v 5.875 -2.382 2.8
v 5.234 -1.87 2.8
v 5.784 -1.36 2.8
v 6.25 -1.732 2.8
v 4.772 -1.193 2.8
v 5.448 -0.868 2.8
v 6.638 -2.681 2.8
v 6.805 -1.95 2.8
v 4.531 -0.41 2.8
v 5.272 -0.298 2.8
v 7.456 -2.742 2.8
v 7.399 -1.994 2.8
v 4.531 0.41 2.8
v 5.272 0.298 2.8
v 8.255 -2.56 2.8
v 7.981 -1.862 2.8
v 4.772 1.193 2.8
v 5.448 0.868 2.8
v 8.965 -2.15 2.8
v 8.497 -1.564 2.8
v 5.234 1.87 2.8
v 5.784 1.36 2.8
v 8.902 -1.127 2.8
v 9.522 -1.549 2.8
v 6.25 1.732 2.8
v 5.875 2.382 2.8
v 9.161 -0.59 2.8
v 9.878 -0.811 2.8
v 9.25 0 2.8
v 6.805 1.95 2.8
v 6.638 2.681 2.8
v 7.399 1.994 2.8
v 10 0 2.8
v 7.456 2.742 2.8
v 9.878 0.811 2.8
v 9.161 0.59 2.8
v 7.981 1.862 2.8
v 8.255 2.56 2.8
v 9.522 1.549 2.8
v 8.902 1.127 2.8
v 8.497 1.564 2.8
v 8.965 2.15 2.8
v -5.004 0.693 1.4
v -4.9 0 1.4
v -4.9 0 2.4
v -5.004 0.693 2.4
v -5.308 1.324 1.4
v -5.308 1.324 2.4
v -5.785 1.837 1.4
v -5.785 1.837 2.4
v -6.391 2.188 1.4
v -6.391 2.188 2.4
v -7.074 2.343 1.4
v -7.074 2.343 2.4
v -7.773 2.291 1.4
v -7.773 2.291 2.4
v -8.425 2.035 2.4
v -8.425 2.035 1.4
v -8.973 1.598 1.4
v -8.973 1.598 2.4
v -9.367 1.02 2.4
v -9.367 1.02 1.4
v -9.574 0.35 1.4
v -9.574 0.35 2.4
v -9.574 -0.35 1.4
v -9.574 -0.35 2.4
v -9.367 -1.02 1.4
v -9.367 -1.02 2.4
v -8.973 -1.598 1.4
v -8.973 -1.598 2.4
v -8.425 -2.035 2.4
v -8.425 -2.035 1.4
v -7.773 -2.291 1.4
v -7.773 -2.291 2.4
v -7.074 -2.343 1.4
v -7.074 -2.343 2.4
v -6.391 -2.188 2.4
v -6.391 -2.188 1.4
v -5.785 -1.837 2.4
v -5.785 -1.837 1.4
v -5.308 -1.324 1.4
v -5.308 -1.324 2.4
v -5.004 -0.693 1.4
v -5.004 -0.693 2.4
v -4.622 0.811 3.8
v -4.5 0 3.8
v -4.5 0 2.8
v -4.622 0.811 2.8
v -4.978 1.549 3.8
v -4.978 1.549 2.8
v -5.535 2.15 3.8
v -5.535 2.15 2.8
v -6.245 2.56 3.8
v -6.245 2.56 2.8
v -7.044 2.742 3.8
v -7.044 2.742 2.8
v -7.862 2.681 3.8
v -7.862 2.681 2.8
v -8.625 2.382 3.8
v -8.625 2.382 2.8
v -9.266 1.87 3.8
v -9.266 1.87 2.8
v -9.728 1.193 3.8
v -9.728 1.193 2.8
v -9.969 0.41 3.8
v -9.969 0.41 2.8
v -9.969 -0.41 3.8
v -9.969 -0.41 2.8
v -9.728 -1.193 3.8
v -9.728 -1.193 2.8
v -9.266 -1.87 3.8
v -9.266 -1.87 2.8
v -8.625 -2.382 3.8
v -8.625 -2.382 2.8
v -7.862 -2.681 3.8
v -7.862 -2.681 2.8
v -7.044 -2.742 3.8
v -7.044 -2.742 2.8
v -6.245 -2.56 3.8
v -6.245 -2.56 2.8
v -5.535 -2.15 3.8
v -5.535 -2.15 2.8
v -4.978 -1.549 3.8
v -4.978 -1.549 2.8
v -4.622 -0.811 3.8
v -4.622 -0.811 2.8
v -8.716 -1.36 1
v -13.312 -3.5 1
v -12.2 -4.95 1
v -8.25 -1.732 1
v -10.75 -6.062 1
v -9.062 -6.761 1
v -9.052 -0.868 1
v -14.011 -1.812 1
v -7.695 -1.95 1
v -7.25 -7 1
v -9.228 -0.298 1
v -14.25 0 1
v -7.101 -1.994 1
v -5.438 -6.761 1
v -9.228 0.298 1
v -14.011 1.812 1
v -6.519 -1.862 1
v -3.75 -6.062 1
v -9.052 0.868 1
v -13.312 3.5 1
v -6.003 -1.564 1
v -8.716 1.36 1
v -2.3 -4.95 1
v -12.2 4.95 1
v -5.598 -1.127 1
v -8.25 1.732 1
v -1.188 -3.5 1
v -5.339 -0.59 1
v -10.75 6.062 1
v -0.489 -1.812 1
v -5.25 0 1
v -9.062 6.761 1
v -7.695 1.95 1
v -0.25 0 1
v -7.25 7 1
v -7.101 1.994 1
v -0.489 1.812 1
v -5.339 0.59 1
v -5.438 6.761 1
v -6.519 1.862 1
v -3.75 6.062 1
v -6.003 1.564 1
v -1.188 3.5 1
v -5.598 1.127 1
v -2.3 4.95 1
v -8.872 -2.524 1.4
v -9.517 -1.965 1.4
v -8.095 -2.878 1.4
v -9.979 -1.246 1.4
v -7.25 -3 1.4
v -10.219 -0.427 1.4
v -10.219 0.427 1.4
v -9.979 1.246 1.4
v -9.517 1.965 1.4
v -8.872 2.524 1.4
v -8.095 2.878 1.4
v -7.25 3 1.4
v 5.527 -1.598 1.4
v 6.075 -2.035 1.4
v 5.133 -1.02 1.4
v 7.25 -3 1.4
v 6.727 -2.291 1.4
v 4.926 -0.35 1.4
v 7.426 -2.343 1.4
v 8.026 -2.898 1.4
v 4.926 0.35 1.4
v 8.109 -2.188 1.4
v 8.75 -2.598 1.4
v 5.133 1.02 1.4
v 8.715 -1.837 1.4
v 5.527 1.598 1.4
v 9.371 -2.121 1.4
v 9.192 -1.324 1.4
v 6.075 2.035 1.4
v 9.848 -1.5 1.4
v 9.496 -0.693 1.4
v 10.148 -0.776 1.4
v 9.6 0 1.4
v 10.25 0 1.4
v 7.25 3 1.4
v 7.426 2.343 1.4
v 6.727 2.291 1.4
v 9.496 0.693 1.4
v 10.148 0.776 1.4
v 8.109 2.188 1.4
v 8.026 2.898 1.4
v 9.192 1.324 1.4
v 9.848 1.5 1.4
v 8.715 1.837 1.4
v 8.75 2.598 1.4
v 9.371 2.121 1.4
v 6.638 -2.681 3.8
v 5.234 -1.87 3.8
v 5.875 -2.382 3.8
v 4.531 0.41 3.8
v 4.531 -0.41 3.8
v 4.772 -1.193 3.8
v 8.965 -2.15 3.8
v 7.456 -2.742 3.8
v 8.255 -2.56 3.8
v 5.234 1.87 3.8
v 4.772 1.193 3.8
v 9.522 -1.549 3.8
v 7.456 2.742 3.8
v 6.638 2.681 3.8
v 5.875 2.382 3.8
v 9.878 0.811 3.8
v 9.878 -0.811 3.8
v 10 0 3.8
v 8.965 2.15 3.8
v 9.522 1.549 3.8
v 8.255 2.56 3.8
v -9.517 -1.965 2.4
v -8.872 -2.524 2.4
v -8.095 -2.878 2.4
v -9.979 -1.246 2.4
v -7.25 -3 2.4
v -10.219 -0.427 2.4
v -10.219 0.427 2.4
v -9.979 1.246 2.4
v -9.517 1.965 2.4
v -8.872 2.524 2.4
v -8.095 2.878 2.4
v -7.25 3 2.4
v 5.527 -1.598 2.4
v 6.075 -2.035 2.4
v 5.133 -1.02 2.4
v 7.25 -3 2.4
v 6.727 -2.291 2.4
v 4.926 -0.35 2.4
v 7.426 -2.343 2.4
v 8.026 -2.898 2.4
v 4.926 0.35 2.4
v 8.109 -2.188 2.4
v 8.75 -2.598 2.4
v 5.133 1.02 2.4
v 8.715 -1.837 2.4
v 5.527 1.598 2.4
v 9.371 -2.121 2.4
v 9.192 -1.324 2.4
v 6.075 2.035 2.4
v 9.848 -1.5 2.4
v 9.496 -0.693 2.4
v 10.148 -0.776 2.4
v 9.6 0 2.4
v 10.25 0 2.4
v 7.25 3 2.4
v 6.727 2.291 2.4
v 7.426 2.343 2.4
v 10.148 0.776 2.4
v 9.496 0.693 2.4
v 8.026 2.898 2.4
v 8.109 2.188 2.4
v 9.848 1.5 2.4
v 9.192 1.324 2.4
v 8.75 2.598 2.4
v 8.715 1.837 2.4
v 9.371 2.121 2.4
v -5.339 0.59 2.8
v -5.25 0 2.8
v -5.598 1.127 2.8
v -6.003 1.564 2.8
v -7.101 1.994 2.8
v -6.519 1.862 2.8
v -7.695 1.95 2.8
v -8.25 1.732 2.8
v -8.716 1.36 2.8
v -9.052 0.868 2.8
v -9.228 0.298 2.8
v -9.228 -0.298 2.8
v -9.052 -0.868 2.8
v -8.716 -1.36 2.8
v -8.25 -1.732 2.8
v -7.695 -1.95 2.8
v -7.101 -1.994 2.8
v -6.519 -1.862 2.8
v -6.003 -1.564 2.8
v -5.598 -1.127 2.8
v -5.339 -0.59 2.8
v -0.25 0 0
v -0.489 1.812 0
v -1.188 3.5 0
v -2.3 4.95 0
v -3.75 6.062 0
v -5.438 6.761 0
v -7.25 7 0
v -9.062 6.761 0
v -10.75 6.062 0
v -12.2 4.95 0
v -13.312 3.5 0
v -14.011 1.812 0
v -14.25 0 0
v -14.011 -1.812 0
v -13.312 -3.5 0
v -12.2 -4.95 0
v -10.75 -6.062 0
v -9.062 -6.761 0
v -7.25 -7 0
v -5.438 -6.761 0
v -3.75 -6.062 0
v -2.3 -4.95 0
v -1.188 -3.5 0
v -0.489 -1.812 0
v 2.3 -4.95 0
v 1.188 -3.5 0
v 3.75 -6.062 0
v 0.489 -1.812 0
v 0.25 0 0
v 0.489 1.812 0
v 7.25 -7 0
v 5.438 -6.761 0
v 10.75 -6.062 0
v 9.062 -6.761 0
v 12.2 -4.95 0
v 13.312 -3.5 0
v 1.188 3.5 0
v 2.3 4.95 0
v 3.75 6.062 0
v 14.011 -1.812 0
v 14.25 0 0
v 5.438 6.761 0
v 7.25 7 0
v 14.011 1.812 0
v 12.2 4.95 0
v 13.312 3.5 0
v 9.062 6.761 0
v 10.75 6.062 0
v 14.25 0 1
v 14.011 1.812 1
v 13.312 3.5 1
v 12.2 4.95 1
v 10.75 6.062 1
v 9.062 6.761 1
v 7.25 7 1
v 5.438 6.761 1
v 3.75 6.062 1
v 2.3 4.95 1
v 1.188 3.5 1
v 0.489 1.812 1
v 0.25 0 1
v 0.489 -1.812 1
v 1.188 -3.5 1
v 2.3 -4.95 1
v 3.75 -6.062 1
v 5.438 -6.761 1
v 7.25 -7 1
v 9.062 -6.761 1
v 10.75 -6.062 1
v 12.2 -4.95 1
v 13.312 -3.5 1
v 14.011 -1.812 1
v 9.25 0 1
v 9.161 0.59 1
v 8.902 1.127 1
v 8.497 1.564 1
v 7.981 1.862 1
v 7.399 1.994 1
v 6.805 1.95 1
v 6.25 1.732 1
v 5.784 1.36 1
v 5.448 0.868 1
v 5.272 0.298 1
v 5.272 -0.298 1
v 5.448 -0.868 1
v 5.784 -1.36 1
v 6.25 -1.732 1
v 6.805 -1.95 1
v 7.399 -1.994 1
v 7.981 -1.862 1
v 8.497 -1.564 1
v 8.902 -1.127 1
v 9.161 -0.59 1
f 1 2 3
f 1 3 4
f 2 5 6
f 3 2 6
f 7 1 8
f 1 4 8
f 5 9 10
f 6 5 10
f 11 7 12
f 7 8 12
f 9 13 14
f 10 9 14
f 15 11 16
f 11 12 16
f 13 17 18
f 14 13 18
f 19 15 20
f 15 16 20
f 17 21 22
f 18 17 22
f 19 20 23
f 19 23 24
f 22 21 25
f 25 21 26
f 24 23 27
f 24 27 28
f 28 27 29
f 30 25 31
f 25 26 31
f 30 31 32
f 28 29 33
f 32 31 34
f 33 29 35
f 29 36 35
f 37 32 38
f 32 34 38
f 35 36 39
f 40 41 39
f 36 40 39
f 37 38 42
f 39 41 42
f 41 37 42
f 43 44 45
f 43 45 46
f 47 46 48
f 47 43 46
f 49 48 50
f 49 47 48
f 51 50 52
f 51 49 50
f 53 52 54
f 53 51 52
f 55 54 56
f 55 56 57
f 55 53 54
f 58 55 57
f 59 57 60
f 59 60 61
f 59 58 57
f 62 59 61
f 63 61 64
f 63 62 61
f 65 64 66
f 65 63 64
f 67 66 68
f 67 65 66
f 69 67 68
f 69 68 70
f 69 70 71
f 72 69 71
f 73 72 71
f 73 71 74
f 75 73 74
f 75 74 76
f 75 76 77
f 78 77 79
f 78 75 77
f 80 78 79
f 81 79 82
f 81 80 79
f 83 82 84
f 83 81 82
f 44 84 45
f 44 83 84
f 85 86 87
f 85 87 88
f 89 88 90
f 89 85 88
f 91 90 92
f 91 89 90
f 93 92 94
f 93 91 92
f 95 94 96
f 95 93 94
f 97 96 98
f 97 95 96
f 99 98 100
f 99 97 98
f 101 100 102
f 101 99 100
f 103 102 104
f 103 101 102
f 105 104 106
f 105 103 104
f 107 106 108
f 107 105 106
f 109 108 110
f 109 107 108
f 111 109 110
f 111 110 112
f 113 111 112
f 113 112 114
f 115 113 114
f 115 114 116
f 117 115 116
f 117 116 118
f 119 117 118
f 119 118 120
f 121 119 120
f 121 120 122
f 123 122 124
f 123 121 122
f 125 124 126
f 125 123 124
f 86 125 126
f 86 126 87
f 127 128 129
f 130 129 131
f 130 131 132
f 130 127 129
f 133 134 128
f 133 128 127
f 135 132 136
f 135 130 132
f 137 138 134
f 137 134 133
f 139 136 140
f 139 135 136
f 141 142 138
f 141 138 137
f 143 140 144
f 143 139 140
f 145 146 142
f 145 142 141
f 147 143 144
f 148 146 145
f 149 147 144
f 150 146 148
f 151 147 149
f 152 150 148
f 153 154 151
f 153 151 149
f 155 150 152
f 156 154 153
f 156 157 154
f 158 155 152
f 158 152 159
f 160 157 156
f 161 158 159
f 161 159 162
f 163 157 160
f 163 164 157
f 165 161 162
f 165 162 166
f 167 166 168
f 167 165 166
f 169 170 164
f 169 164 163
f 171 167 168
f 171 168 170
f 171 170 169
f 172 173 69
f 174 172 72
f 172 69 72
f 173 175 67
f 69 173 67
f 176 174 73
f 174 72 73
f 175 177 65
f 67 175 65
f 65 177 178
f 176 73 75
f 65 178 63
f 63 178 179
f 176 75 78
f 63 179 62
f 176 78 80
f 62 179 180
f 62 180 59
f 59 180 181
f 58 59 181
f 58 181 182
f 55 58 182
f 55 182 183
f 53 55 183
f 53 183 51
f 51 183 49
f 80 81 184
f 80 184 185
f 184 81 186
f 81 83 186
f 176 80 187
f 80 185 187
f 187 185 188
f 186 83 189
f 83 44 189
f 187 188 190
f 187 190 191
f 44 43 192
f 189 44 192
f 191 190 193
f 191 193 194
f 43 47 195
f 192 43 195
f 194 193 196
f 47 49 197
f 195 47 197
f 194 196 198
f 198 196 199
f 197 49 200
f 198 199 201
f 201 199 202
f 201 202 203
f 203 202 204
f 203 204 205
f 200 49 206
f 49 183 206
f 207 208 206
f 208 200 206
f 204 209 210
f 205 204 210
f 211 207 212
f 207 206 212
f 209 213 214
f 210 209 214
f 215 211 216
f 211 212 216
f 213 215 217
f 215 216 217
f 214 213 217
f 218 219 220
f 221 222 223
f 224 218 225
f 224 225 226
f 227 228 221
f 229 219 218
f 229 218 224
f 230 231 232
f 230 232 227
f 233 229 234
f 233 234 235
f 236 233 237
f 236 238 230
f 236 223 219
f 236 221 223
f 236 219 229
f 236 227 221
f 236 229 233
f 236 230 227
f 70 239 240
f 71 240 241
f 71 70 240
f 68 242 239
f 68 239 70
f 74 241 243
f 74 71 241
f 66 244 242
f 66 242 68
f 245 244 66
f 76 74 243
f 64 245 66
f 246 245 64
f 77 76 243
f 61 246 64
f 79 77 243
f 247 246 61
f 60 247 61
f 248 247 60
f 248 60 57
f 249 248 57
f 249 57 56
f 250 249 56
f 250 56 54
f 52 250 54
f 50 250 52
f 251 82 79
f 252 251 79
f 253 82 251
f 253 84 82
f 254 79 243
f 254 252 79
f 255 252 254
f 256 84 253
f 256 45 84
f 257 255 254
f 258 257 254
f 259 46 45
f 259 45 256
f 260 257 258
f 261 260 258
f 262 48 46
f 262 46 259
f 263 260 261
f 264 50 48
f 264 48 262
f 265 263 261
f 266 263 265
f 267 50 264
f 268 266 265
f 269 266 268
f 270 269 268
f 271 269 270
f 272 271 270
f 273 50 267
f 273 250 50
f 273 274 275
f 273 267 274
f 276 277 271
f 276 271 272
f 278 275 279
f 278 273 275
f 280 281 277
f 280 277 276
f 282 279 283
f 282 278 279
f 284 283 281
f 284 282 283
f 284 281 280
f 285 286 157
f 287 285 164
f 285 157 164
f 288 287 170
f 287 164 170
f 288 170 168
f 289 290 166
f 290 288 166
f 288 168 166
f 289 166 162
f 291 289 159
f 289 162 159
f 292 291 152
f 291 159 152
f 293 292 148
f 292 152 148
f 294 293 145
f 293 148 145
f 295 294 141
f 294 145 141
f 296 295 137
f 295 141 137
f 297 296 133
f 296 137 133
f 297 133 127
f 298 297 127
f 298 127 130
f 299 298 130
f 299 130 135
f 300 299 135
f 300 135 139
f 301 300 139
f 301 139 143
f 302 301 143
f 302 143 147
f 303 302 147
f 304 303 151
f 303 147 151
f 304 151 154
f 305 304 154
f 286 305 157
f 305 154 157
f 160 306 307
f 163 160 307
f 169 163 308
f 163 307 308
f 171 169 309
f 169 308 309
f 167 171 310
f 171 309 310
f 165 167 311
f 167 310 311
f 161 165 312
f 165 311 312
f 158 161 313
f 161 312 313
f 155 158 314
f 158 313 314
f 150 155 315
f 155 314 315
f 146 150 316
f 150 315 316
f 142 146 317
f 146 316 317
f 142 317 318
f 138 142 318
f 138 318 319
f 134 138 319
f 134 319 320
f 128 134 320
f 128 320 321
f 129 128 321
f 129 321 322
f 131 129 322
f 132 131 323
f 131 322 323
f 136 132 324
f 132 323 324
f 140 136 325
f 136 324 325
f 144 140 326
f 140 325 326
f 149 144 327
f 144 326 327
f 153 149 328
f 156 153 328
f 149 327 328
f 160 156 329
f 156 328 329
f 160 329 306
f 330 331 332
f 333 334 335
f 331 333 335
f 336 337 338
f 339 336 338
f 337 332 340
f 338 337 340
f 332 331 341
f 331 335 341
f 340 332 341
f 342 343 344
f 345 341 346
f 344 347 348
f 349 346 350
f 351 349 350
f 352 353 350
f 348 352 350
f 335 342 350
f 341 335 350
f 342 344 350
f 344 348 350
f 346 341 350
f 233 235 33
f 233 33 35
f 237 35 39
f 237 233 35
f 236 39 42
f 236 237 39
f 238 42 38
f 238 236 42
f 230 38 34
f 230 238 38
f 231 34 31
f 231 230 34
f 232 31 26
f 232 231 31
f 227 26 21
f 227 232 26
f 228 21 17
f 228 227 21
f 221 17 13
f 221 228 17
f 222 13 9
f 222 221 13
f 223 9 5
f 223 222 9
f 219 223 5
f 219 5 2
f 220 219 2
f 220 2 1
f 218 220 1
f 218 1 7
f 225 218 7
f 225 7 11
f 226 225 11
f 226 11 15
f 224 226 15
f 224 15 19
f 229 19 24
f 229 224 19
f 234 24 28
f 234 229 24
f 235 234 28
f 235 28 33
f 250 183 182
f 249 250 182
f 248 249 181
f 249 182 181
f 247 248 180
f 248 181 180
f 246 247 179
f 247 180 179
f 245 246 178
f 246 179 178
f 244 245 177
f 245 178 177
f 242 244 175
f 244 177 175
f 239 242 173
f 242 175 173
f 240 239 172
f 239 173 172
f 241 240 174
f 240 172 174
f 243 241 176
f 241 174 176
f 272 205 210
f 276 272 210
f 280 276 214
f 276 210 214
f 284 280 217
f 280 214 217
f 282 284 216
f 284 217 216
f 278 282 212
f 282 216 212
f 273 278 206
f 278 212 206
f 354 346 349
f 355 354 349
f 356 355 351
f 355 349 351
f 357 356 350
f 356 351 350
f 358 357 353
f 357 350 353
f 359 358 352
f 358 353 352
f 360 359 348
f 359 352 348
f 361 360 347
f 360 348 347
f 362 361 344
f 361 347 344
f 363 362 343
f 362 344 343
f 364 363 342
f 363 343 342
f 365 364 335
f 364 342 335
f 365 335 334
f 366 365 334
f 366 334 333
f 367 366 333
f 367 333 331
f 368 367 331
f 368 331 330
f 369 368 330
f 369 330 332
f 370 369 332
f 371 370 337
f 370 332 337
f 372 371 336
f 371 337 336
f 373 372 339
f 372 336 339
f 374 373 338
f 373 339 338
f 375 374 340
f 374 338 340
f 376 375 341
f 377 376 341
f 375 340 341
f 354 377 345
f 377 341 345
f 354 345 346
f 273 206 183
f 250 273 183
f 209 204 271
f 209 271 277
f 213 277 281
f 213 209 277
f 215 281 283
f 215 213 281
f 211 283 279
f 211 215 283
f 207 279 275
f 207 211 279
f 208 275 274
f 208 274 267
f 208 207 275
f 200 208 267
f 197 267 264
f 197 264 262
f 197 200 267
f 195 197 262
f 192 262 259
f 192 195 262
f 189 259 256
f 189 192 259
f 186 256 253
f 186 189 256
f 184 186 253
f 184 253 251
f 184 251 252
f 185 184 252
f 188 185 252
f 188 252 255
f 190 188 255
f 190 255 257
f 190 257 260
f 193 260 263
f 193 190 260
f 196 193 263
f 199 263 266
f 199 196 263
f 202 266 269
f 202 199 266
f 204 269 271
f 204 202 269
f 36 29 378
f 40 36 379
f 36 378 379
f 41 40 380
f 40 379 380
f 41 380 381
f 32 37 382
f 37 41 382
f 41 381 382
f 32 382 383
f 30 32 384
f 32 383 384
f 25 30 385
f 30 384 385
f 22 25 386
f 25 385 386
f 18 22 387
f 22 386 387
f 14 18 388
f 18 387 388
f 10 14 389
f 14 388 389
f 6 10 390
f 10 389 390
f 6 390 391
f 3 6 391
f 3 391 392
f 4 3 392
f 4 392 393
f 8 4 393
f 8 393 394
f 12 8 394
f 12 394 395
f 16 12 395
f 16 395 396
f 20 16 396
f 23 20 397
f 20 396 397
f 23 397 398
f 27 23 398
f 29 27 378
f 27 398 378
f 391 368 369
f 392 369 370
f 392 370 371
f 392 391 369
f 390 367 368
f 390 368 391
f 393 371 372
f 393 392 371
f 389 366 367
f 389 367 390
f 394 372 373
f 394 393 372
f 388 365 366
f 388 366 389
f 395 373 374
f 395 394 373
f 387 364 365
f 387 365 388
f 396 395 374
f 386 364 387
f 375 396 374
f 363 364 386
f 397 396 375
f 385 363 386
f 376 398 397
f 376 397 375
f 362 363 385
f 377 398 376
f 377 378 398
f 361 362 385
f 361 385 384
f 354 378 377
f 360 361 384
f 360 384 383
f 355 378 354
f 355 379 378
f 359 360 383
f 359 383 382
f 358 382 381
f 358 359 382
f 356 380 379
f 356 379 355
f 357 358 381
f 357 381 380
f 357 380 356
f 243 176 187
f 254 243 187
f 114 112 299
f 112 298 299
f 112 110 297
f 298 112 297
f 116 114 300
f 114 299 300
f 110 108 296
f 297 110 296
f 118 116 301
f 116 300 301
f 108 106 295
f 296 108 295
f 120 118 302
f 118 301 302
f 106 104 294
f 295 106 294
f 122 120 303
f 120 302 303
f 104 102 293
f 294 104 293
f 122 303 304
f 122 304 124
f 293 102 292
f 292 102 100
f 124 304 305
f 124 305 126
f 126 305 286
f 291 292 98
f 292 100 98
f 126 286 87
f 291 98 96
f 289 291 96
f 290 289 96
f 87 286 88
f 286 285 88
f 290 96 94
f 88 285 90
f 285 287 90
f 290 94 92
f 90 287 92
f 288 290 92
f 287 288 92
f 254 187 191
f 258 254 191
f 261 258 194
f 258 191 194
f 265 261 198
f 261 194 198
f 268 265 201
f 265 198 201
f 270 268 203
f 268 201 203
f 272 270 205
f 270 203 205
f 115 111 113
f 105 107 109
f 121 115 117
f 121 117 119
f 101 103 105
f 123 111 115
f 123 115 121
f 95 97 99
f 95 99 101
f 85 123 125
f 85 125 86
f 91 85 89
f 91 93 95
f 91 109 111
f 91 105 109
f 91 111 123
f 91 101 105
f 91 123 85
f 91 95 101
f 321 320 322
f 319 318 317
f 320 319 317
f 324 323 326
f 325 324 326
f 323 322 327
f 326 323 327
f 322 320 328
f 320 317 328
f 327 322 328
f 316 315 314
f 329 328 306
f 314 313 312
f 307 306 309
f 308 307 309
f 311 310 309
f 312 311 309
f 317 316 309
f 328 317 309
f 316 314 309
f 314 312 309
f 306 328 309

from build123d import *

# Parameters (mm, degrees)
F0_R     = 7
F0_R_2   = 2
F1_DEPTH = 1
F2_DEPTH = 3.8
F4_R     = 2.35
F5_DEPTH = 1
F6_R     = 2.75
F7_DEPTH = 1


with BuildPart() as f1:
    # F0 (on Top) → F1 (new body)
    with BuildSketch(Plane.XY):
        with Locations((-7.25, 0)):
            Circle(F0_R)
        with Locations((-7.25, 0)):
            Circle(F0_R_2, mode=Mode.SUBTRACT)
    extrude(amount=F1_DEPTH)

    # F0 (on Top) → F2 (join)
    with BuildSketch(Plane.XY):
        with Locations((-7.25, 0)):
            Circle(F0_R_2)
    extrude(amount=F2_DEPTH)

    # F6 (on face) → F7 (join)
    with BuildSketch(Plane.XY.offset(3.8)):
        with Locations((-7.25, 0)):
            Circle(F6_R)
    extrude(amount=-F7_DEPTH)


with BuildPart() as f1b:
    # F0 (on Top) → F1, piece 2 (new body)
    with BuildSketch(Plane.XY):
        with Locations((7.25, 0)):
            Circle(F0_R)
        with Locations((7.25, 0)):
            Circle(F0_R_2, mode=Mode.SUBTRACT)
    extrude(amount=F1_DEPTH)

    # F0 (on Top) → F2, piece 2 (join)
    with BuildSketch(Plane.XY):
        with Locations((7.25, 0)):
            Circle(F0_R_2)
    extrude(amount=F2_DEPTH)

    # F6 (on face) → F7, piece 2 (join)
    with BuildSketch(Plane.XY.offset(3.8)):
        with Locations((7.25, 0)):
            Circle(F6_R)
    extrude(amount=-F7_DEPTH)


with BuildPart() as f5:
    # F4 (on offset) → F5 (new body)
    with BuildSketch(Plane.XY.offset(1.4)):
        with BuildLine():
            ThreePointArc((-7.25, -3), (-5.1286796564, -2.1213203436), (-4.25, 0))
            ThreePointArc((-4.25, 0), (-5.1286796564, 2.1213203436), (-7.25, 3))
            ThreePointArc((-7.25, 3), (-10.25, 0), (-7.25, -3))
        make_face()
        with Locations((-7.25, 0)):
            Circle(F4_R, mode=Mode.SUBTRACT)
        with BuildLine():
            ThreePointArc((-7.25, 3), (-5.1286796564, 2.1213203436), (-4.25, 0))
            ThreePointArc((-4.25, 0), (-5.1286796564, -2.1213203436), (-7.25, -3))
            Line((-7.25, -3), (7.25, -3))
            ThreePointArc((7.25, -3), (4.25, 0), (7.25, 3))
            Line((7.25, 3), (-7.25, 3))
        make_face()
        with BuildLine():
            ThreePointArc((10.25, 0), (9.3713203436, 2.1213203436), (7.25, 3))
            ThreePointArc((7.25, 3), (4.25, 0), (7.25, -3))
            ThreePointArc((7.25, -3), (9.3713203436, -2.1213203436), (10.25, 0))
        make_face()
        with Locations((7.25, 0)):
            Circle(F4_R, mode=Mode.SUBTRACT)
    extrude(amount=F5_DEPTH)


solid = Compound([f1.part, f1b.part, f5.part])
